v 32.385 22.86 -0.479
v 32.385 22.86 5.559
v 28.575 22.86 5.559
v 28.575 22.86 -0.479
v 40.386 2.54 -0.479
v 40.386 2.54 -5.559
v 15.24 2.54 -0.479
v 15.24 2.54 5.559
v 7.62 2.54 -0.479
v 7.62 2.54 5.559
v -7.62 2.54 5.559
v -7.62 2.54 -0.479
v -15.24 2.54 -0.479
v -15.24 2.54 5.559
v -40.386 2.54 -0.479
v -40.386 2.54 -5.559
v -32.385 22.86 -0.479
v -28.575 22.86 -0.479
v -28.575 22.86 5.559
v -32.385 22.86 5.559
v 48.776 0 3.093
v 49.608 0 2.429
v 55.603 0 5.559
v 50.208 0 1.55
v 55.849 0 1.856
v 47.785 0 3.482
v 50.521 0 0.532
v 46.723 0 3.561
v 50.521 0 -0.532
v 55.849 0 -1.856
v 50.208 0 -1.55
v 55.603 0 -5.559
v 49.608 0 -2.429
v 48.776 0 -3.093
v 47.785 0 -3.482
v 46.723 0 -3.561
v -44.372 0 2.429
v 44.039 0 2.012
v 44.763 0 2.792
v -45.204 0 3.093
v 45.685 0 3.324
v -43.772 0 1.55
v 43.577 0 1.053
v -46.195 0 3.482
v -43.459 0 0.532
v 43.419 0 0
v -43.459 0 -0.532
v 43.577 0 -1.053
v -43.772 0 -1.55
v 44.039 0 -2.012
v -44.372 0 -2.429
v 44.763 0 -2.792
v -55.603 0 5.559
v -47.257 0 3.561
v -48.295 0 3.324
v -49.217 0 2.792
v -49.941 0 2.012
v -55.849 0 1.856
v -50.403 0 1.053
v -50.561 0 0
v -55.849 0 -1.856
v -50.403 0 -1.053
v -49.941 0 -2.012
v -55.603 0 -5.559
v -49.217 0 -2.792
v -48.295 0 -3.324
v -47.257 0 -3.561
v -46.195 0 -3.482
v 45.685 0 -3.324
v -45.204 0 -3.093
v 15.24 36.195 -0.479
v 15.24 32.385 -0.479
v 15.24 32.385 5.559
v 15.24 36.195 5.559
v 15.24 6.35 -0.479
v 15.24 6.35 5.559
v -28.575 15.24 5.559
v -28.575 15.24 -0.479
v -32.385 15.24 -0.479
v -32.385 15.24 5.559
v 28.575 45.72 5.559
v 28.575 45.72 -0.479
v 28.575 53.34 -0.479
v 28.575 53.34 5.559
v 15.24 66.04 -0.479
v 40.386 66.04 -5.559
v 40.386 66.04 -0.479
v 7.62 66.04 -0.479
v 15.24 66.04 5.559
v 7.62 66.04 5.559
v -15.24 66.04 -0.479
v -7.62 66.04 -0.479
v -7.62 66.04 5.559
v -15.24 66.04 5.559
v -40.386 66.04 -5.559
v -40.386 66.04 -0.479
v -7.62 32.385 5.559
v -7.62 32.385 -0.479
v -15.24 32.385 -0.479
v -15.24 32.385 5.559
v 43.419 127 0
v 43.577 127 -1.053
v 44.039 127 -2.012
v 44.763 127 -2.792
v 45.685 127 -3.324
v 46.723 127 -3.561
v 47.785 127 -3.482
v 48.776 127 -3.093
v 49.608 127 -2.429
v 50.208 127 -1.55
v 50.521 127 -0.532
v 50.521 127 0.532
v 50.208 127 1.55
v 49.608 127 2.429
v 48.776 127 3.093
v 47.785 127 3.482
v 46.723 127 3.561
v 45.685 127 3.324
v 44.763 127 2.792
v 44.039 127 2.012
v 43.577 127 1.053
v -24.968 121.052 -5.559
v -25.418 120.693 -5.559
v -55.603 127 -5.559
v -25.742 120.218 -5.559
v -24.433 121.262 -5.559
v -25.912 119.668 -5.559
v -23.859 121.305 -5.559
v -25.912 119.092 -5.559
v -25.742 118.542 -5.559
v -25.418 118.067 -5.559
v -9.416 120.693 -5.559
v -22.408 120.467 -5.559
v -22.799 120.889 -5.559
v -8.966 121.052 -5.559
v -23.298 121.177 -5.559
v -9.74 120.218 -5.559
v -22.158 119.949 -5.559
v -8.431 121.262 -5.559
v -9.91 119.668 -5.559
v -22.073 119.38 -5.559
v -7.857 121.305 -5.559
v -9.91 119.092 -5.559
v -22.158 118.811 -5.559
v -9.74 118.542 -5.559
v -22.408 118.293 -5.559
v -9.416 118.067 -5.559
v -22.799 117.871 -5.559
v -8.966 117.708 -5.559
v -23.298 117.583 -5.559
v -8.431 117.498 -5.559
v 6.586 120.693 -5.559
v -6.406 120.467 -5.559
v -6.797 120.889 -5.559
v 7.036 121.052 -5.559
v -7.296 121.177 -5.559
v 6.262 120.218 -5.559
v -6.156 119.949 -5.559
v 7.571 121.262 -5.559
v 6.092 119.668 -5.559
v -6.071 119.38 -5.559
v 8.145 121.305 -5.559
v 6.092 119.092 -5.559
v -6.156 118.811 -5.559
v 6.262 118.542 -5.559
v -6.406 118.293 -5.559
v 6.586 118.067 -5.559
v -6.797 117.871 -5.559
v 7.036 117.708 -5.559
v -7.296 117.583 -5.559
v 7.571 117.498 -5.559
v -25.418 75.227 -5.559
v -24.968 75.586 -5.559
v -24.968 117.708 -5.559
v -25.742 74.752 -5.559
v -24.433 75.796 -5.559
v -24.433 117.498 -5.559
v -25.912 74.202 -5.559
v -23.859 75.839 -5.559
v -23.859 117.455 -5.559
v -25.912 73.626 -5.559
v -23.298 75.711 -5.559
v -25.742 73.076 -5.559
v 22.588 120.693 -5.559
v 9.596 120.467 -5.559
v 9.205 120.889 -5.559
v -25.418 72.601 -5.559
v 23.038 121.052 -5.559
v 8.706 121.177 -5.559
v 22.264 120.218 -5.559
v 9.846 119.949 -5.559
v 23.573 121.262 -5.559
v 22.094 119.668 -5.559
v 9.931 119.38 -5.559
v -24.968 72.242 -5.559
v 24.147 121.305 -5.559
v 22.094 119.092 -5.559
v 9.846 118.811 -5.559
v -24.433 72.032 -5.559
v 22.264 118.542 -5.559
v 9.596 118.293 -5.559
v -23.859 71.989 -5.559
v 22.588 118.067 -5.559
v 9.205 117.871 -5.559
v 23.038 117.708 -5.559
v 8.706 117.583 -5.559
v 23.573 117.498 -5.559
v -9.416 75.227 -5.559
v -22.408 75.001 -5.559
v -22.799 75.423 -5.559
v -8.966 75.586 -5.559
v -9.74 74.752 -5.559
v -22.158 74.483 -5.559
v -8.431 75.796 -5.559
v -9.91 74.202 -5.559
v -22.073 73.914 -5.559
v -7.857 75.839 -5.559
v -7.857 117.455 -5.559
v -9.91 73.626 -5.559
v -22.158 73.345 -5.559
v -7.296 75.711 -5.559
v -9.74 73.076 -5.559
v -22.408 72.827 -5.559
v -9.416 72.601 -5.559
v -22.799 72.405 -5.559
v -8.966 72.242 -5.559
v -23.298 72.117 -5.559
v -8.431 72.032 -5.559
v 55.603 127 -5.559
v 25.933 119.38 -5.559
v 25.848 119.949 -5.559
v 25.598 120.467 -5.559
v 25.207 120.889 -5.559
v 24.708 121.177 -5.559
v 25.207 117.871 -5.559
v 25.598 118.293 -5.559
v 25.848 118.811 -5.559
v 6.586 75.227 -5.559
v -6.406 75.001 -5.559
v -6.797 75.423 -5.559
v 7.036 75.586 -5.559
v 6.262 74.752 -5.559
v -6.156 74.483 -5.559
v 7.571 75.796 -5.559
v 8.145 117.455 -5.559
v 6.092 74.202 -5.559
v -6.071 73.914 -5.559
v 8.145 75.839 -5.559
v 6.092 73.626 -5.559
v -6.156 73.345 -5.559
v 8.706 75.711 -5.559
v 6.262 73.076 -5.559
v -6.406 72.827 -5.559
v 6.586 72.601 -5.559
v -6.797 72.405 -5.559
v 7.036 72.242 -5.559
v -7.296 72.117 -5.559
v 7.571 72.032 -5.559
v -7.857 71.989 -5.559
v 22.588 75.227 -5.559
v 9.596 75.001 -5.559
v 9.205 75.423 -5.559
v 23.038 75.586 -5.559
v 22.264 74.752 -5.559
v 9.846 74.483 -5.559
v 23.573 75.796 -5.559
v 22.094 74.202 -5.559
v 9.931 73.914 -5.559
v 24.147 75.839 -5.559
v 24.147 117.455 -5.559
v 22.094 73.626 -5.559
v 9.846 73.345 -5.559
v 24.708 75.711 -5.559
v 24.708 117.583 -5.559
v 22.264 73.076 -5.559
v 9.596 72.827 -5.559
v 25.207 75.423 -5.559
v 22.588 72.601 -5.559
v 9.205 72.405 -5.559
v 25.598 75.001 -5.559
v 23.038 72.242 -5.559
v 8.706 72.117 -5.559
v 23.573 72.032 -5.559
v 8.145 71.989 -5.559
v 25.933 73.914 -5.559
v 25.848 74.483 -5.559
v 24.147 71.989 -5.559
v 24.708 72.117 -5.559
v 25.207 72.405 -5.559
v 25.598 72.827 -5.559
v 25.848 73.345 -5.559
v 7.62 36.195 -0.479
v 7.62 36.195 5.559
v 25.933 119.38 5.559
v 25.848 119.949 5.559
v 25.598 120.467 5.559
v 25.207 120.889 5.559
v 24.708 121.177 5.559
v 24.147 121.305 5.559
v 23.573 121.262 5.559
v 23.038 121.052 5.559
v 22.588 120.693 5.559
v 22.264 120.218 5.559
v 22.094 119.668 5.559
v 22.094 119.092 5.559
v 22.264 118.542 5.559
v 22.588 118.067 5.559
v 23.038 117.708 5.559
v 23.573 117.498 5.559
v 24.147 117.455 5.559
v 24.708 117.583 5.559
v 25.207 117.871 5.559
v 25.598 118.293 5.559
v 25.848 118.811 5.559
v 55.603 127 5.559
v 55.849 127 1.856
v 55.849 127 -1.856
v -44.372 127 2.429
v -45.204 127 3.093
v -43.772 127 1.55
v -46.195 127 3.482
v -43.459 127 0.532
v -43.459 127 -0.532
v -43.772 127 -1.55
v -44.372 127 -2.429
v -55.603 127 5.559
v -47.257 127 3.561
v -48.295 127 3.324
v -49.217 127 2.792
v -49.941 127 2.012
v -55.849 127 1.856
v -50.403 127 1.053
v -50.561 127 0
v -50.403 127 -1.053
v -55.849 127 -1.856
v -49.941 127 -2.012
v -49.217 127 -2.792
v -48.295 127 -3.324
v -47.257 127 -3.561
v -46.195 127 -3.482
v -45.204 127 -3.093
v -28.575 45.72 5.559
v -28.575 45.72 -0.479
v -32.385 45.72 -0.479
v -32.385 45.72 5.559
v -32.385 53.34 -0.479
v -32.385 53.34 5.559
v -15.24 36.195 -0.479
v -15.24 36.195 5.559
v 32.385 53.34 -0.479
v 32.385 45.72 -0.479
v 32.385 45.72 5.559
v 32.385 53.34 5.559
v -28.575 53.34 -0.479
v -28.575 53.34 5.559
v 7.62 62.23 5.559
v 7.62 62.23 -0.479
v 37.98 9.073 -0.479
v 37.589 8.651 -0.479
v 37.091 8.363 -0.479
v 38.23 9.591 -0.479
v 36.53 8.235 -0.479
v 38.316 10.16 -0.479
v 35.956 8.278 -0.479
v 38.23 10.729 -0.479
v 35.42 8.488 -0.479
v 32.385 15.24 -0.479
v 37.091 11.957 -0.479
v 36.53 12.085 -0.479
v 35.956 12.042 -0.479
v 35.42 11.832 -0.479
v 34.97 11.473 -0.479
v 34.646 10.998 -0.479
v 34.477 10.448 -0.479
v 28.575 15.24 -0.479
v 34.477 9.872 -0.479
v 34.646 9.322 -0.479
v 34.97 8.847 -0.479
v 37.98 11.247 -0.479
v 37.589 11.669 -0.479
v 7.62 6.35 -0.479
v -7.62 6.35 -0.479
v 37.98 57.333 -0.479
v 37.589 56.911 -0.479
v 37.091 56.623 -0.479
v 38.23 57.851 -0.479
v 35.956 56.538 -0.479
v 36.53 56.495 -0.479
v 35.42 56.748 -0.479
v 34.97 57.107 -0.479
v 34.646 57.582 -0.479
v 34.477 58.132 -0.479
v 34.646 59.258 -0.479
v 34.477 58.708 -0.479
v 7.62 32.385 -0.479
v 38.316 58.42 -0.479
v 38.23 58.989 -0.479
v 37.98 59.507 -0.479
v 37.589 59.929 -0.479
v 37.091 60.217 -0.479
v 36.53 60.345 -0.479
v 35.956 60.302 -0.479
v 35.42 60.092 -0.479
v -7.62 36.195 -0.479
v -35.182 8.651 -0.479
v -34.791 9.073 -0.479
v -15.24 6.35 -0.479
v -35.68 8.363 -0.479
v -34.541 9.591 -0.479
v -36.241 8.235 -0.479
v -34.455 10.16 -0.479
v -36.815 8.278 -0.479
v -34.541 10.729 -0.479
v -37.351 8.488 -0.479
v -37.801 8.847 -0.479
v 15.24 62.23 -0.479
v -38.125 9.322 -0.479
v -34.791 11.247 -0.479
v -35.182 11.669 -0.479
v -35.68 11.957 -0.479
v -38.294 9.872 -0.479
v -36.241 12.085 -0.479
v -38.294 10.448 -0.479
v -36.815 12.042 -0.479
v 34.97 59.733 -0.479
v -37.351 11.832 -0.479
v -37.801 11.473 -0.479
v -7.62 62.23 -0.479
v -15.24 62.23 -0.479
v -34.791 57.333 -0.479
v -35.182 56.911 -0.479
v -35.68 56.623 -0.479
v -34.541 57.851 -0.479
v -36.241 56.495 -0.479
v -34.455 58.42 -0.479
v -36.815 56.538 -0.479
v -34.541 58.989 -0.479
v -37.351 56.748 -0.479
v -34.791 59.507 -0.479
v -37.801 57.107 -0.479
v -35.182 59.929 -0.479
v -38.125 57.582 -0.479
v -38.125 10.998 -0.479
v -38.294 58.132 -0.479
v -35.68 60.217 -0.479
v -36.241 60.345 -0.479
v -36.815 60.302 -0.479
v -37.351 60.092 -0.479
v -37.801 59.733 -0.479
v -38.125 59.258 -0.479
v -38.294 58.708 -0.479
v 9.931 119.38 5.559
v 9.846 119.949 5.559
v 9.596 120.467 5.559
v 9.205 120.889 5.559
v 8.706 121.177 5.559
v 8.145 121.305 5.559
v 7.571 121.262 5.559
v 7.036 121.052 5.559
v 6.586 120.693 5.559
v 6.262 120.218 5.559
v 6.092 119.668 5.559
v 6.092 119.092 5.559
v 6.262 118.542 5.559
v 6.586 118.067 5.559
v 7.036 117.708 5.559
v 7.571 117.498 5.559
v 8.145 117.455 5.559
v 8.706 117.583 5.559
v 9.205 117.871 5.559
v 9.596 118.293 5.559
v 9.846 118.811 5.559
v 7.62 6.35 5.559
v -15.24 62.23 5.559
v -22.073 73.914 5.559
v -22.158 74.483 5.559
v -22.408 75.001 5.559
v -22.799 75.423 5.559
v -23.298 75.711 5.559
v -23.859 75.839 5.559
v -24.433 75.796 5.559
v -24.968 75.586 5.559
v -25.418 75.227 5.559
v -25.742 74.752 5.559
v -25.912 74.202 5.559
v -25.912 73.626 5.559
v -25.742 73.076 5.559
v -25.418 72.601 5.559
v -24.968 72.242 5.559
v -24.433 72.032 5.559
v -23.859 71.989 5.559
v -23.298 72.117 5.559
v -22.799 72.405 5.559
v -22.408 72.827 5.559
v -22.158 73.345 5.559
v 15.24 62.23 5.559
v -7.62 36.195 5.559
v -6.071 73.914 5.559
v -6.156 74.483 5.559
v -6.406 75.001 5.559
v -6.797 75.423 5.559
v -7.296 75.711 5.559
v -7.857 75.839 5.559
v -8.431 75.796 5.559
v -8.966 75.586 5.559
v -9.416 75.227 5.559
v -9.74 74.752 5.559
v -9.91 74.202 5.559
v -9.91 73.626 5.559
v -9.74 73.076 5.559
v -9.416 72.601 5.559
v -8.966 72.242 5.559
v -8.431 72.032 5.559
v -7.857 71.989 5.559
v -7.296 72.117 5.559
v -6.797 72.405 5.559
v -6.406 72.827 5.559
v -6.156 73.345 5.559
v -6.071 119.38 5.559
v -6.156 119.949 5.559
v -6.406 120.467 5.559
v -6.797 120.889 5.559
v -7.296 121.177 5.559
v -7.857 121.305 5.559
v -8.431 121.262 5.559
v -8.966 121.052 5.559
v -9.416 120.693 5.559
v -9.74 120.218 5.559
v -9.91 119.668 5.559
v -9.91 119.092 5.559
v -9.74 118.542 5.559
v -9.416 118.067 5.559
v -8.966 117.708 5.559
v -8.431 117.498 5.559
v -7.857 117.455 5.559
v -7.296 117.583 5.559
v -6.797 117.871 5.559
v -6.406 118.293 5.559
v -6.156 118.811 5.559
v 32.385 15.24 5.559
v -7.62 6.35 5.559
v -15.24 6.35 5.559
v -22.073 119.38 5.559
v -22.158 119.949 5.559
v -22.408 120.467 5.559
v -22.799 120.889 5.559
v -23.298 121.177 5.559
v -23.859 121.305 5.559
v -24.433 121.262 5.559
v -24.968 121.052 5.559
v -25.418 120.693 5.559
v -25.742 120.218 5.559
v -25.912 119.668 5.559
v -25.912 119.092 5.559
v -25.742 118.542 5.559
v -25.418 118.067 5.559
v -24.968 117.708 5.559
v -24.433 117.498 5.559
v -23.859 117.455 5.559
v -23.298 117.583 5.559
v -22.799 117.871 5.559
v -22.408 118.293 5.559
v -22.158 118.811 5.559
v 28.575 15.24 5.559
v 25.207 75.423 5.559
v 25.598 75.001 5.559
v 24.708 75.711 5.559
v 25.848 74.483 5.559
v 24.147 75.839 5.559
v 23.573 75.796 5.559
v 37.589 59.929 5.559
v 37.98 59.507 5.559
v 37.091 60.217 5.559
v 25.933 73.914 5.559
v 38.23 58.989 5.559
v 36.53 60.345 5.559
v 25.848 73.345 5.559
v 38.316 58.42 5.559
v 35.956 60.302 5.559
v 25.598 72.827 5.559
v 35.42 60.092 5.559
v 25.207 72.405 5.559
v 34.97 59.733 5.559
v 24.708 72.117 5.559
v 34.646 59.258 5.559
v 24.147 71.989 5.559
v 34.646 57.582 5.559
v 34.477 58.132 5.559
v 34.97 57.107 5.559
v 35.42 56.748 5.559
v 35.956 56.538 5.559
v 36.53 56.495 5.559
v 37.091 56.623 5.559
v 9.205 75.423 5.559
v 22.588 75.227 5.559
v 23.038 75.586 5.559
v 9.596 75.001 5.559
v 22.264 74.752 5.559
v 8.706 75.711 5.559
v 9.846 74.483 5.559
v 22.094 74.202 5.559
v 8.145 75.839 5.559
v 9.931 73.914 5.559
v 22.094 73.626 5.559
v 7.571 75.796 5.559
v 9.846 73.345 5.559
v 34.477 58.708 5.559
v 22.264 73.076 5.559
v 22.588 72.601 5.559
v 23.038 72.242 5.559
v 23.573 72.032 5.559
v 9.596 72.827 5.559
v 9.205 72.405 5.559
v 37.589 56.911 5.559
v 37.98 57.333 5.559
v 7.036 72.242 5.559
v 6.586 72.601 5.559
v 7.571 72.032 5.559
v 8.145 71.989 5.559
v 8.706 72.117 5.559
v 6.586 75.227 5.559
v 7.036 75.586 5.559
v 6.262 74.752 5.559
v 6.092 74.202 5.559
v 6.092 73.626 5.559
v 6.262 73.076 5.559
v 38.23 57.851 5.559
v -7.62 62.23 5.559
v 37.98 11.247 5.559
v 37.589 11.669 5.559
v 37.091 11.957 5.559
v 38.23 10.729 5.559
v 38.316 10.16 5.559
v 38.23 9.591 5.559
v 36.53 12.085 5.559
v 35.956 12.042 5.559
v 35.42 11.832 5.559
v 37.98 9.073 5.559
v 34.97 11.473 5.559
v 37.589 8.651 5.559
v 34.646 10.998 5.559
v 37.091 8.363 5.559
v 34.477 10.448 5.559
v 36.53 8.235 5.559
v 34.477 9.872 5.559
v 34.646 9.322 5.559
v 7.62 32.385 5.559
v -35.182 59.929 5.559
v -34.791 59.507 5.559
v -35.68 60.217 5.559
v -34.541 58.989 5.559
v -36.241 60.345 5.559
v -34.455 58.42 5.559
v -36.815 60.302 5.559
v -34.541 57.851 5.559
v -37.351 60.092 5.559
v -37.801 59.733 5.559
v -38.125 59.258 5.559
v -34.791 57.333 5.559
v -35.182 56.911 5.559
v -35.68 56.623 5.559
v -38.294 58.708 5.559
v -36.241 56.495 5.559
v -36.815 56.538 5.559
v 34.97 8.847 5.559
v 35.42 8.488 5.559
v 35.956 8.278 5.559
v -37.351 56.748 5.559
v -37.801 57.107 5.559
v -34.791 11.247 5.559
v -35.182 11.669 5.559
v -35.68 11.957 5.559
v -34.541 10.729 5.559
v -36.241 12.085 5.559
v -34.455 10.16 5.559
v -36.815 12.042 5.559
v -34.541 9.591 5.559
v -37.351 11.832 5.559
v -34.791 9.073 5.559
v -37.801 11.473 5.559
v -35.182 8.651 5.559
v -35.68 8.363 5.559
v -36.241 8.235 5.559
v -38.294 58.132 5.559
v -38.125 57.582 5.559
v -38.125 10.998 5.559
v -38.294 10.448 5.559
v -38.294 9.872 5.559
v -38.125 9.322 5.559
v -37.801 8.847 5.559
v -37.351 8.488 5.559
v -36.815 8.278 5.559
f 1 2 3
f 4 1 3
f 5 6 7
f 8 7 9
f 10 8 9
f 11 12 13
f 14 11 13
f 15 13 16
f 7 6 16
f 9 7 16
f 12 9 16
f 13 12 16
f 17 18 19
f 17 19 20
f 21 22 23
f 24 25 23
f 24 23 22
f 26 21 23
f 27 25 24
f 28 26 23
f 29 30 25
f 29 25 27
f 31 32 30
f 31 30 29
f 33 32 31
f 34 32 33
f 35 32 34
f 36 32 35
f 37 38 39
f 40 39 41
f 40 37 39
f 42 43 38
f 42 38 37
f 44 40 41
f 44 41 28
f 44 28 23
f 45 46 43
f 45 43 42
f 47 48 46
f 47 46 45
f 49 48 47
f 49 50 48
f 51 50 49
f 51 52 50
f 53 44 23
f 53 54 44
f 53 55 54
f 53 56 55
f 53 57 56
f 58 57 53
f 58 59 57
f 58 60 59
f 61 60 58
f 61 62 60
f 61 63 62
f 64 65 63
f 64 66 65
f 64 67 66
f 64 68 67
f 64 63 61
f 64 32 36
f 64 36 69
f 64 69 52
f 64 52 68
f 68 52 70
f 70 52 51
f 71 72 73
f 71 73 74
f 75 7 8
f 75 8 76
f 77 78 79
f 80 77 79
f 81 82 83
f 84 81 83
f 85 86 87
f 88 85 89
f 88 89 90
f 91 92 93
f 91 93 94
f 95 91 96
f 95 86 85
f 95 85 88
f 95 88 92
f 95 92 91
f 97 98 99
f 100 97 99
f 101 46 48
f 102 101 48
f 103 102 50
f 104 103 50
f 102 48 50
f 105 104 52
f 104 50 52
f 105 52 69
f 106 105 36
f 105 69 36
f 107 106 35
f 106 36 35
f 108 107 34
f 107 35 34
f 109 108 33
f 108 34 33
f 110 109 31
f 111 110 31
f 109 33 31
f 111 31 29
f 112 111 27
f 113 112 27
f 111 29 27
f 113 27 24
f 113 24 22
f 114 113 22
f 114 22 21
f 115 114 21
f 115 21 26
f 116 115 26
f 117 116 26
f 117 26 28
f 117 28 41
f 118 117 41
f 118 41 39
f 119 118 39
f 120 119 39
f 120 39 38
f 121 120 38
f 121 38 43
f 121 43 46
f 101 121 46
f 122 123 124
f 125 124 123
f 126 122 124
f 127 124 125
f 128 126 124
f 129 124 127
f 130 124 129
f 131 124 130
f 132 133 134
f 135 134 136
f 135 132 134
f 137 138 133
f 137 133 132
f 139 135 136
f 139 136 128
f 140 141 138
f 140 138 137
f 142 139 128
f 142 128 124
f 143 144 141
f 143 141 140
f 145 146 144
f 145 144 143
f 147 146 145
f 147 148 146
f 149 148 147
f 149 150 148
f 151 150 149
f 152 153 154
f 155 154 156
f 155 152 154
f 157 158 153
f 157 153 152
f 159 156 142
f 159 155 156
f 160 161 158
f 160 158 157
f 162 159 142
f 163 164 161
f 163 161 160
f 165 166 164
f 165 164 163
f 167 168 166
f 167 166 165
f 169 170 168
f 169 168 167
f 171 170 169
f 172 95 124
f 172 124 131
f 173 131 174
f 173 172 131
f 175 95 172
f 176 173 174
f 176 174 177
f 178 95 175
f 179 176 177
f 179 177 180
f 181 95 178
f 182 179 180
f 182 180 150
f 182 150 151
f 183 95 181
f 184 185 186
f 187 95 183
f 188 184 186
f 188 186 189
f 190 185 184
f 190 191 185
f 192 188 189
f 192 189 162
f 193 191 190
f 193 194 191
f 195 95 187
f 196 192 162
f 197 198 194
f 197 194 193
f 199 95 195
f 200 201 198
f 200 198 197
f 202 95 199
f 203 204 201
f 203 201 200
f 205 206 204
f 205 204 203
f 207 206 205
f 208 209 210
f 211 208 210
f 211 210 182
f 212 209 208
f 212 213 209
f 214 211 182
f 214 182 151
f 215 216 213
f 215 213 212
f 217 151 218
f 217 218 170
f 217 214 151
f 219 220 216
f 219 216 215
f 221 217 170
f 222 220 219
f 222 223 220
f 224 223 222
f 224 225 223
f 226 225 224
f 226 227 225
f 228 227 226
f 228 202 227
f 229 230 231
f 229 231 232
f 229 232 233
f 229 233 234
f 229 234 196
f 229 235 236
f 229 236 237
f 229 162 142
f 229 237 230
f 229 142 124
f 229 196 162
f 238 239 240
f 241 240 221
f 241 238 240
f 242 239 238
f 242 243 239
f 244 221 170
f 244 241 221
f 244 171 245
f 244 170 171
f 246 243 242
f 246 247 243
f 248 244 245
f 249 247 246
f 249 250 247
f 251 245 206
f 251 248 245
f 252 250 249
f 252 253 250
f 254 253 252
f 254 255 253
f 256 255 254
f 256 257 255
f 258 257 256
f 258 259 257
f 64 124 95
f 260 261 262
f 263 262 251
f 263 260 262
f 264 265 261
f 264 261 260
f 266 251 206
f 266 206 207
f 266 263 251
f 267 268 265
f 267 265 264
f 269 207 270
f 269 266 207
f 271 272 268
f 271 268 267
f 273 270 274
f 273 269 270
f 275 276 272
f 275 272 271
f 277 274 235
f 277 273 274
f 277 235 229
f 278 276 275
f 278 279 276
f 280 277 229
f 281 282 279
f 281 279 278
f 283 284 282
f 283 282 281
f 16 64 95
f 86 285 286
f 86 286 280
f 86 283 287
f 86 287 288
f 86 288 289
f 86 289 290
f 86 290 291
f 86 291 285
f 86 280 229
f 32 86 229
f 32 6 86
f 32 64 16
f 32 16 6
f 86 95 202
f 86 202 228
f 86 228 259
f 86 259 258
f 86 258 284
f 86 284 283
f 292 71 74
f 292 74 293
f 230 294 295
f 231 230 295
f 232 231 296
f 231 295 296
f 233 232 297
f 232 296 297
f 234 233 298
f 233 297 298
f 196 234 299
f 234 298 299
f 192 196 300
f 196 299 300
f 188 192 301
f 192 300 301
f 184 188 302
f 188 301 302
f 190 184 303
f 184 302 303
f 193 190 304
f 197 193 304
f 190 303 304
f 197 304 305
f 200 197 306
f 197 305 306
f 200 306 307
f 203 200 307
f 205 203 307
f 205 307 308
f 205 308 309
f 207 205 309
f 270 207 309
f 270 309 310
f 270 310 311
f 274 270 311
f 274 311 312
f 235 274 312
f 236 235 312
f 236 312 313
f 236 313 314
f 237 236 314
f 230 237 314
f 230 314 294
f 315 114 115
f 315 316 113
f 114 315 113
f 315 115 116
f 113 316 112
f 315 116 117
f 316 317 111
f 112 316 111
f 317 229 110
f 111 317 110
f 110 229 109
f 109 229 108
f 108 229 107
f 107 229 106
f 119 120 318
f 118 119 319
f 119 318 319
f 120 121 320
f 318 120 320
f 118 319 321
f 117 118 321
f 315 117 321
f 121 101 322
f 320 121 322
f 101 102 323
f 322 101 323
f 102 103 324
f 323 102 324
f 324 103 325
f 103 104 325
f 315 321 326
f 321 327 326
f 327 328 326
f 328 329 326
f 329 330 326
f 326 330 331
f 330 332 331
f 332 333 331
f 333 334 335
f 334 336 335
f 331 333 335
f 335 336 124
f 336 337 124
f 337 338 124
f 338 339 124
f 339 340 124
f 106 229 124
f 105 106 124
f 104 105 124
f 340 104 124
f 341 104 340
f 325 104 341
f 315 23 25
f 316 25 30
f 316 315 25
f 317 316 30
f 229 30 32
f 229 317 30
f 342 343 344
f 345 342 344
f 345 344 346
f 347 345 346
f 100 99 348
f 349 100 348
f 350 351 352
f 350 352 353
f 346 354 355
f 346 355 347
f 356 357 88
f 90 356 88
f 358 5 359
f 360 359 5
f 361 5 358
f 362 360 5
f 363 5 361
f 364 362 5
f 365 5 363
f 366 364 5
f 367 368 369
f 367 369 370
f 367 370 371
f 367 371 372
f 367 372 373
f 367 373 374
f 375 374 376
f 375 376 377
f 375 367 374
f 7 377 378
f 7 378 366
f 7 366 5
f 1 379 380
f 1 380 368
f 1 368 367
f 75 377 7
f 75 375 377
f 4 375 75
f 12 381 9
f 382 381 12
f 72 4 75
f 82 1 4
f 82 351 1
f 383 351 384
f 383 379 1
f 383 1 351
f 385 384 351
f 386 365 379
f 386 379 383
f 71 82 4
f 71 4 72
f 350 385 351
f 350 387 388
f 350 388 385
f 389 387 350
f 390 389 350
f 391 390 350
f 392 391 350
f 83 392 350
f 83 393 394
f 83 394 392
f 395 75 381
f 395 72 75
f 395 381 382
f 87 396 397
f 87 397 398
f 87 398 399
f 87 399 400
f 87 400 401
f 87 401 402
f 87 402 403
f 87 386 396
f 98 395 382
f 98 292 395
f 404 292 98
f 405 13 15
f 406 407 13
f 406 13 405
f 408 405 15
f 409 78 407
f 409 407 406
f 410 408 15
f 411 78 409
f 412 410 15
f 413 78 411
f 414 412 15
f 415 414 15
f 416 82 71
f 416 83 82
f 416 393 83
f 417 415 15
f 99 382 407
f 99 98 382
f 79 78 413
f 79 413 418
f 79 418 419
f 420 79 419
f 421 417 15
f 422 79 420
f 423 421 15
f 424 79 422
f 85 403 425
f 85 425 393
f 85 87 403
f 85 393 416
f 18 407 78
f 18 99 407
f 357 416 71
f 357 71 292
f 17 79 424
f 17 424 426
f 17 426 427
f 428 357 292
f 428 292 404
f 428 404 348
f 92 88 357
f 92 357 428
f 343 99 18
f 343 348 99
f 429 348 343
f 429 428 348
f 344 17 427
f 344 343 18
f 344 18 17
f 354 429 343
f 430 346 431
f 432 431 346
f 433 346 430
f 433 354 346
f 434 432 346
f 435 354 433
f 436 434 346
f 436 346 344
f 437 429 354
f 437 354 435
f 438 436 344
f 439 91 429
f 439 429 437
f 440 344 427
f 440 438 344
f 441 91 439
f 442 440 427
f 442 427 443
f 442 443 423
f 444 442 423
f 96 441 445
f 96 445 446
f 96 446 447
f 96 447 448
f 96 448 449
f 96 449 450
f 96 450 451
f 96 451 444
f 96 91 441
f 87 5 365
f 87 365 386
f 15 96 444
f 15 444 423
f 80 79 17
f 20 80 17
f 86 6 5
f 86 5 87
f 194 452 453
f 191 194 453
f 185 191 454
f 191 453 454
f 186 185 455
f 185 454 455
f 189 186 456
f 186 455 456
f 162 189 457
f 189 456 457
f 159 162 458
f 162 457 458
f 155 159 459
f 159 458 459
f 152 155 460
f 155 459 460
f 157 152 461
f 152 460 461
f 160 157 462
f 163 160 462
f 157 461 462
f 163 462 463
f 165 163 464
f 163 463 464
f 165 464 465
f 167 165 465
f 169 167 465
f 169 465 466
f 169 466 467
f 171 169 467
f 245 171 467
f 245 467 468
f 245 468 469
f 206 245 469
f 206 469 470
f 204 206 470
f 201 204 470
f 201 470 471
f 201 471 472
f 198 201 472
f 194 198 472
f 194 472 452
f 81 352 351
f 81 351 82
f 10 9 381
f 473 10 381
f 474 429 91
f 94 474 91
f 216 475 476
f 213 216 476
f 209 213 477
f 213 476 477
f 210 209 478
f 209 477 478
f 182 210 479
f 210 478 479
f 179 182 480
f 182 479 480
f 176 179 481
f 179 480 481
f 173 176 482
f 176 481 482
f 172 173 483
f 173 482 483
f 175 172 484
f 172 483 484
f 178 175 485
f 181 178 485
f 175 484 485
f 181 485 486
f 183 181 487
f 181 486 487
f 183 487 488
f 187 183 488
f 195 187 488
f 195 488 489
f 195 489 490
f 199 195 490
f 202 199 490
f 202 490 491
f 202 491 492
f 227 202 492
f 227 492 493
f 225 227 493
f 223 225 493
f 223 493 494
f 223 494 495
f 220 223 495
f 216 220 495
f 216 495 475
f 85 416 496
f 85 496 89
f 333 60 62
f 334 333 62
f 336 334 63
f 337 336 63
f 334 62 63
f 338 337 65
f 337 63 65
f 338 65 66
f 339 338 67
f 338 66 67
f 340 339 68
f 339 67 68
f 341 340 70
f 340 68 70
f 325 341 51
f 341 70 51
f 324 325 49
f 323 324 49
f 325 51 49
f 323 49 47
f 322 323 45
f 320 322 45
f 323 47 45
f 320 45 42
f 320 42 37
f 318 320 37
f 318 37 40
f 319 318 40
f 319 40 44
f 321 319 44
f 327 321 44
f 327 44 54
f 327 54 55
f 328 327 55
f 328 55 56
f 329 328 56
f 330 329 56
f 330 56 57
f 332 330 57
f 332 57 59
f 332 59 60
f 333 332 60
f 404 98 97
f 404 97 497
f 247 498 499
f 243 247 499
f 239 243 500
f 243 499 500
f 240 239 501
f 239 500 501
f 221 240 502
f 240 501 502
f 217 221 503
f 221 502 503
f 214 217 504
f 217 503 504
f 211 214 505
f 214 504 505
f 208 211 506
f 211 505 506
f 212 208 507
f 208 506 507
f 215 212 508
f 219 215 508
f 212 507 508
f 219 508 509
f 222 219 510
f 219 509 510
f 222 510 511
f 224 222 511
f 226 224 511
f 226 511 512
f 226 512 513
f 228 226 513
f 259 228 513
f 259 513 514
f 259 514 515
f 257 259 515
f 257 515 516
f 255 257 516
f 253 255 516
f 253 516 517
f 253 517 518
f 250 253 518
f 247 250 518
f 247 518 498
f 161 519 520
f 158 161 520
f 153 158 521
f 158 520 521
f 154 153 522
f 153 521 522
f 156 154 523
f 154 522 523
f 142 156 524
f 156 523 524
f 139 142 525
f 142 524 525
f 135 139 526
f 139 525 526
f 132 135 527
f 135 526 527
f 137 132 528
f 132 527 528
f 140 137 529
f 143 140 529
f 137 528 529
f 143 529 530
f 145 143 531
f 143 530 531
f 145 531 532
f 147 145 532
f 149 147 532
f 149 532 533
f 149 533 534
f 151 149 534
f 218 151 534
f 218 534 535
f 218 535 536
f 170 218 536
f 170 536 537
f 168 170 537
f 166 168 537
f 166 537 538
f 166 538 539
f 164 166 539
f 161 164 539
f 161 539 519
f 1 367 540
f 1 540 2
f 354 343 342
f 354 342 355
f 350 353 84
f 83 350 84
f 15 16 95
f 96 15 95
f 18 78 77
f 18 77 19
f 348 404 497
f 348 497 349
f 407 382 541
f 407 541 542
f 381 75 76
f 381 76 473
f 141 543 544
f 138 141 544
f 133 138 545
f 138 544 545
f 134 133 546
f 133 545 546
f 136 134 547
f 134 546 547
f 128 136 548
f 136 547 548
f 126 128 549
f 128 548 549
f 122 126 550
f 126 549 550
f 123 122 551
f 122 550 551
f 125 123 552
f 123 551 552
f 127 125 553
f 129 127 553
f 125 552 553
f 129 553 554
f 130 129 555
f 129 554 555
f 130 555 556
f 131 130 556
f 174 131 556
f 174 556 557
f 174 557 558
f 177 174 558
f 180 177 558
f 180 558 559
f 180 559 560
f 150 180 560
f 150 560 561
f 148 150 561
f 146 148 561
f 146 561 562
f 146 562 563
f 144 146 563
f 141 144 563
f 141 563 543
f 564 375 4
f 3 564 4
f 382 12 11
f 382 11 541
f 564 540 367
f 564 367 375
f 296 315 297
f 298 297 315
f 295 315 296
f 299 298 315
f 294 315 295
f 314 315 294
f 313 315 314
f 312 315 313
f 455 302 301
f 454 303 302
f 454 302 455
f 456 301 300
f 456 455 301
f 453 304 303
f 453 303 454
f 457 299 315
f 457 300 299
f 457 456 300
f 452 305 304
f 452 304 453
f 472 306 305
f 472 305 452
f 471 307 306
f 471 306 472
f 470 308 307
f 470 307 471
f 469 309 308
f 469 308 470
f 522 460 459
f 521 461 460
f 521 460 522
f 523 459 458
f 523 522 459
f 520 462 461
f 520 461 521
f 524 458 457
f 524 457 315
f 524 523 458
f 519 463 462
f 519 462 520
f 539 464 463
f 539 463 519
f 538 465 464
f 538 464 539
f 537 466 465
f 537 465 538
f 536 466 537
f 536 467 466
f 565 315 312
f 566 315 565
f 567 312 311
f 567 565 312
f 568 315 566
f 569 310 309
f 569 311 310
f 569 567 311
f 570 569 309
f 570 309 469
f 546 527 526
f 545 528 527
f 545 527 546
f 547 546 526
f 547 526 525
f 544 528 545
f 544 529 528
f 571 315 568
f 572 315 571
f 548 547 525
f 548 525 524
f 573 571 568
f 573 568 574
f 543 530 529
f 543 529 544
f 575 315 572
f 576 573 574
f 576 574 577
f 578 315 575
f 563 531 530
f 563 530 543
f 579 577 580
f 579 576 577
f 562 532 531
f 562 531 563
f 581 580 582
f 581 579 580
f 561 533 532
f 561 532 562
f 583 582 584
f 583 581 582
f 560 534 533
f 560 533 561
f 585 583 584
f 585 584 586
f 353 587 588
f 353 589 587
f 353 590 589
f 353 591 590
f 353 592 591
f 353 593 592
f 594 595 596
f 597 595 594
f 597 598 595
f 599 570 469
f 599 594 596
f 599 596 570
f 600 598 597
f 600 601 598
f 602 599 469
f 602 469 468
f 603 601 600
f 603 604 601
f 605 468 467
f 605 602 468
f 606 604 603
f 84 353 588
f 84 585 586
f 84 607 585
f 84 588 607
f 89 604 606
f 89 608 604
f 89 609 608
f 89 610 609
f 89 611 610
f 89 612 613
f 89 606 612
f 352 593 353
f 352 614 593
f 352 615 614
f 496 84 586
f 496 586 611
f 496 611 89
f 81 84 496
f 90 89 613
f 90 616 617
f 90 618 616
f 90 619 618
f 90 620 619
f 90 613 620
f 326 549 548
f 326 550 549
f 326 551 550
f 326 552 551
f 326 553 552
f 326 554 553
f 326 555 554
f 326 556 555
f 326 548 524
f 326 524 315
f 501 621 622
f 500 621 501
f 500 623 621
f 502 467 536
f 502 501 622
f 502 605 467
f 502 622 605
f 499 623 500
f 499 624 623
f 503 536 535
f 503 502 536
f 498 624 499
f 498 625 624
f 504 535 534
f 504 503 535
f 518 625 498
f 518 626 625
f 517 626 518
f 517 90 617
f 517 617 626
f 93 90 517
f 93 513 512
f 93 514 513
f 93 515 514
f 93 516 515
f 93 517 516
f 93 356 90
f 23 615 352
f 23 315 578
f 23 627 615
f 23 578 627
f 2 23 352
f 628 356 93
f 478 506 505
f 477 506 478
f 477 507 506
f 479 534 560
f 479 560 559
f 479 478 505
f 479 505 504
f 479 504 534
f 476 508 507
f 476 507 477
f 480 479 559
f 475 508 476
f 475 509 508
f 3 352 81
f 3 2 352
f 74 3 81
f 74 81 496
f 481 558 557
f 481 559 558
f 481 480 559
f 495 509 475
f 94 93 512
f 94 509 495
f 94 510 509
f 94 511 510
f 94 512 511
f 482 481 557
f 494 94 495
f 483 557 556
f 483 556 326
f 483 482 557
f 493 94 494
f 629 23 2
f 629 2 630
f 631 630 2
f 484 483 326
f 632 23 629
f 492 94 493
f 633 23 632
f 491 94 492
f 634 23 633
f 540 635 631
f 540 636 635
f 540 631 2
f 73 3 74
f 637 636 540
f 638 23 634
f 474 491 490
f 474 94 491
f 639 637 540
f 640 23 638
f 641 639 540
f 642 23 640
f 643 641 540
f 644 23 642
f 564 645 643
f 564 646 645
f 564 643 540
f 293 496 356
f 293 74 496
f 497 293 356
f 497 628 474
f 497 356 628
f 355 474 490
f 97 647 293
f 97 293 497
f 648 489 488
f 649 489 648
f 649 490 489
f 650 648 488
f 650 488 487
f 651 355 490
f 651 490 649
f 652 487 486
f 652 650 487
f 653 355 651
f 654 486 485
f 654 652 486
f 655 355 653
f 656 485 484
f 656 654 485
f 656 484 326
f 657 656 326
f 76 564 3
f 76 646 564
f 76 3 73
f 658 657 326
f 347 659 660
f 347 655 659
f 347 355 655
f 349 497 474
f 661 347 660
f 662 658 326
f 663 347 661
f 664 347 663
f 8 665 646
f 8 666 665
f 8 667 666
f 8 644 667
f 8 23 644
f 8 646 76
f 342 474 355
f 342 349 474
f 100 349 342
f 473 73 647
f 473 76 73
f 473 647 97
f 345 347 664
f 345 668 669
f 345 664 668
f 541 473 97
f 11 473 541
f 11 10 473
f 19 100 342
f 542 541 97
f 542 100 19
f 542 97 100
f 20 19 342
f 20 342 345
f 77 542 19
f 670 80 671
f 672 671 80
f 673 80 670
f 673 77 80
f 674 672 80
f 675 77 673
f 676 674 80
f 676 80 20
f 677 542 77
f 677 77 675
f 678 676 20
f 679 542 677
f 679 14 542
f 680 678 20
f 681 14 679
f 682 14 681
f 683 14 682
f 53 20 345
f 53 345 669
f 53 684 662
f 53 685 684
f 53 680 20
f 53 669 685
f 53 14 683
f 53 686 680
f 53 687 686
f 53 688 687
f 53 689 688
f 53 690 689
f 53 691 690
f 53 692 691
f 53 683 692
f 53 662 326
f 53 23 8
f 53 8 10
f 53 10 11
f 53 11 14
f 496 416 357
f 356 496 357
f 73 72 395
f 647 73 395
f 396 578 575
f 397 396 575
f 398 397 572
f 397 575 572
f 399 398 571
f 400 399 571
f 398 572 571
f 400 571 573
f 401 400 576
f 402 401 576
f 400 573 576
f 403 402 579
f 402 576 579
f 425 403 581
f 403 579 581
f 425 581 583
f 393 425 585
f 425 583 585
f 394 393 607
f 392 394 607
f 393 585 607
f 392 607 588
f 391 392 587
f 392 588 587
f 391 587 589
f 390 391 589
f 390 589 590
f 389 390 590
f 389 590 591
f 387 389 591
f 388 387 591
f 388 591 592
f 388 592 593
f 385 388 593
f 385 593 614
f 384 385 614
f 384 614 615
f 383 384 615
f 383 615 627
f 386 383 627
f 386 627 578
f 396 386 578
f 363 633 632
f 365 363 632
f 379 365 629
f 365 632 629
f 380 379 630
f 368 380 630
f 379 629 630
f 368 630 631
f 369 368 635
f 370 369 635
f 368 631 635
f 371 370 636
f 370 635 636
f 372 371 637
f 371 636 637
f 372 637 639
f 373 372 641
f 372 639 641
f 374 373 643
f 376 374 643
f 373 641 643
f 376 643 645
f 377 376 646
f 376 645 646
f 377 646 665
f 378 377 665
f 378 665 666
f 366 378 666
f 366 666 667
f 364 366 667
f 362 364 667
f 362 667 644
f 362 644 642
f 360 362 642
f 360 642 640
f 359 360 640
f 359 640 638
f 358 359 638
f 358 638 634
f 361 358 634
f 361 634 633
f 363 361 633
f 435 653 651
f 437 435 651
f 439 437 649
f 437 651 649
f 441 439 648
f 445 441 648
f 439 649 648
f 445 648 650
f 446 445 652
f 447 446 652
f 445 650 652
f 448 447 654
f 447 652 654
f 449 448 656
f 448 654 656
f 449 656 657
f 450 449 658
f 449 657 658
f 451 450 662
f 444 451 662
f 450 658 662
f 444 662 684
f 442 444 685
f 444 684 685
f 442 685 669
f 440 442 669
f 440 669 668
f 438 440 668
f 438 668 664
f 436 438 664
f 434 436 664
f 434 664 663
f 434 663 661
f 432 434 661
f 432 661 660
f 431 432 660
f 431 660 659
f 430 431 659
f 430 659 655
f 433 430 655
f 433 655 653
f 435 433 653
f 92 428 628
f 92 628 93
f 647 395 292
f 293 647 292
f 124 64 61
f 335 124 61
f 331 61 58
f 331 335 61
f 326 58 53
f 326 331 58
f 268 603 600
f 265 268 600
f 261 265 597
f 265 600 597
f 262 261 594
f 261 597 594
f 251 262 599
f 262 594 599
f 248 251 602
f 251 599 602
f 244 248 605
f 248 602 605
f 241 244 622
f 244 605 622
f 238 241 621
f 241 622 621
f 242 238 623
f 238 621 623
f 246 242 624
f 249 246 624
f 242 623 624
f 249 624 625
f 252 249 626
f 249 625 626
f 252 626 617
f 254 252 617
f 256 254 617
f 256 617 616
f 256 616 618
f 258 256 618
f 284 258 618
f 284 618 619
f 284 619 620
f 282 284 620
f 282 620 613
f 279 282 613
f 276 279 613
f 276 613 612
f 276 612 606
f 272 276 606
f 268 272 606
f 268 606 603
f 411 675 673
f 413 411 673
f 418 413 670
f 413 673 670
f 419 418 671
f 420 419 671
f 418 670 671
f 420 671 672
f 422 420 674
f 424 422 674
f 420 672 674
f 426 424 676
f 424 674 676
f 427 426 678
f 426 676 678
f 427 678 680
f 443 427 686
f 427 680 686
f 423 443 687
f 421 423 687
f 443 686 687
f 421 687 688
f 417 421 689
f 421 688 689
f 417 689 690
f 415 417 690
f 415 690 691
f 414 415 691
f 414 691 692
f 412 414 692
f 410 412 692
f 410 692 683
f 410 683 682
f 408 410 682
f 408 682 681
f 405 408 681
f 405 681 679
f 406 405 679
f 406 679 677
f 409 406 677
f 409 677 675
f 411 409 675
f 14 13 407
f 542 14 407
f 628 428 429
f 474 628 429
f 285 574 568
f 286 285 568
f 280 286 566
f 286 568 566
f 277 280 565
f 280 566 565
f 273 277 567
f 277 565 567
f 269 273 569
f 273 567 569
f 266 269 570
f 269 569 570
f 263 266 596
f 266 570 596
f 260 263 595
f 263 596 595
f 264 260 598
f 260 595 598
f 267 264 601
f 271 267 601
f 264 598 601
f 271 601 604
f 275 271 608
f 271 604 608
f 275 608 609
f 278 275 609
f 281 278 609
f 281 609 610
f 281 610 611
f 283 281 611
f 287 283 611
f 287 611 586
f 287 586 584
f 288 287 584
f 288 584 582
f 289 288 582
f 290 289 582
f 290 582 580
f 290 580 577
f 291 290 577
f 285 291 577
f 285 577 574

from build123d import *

# Parameters (mm, degrees)
BOSS_EXTRUDE1_DEPTH     = 127
F_1_4_CLEARANCE_HOLE1_D = 7.14248
F_8_CLEARANCE_HOLE1_D   = 3.8608
SKETCH19_W              = 7.62
SKETCH19_H              = 3.81
SKETCH19_W_2            = 3.81
SKETCH19_H_2            = 7.62
CUT_EXTRUDE3_DEPTH      = 12.118122863
F_8_CLEARANCE_HOLE2_D   = 3.8608
F_8_CLEARANCE_HOLE3_D   = 3.8608
SKETCH10_W              = 64.77
SKETCH10_H              = 63.5
CUT_EXTRUDE4_DEPTH      = 5.08
SKETCH36_R              = 76.2
SKETCH36_R_2            = 55.88
CUT_EXTRUDE5_DEPTH      = 128
SKETCH37_W              = 80.772
SKETCH37_H              = 63.5
CUT_EXTRUDE6_DEPTH      = 5.08


with BuildPart() as part:
    # Sketch1 → Boss-Extrude1 (new body)
    with BuildSketch(Plane(origin=(0, 0, 0), x_dir=(1, 0, 0), z_dir=(0, 1, 0))):
        with BuildLine():
            Line((-60.706, 5.559061432), (60.706, 5.559061432))
            ThreePointArc((60.706, 5.559061432), (60.96, 0), (60.706, -5.559061432))
            Line((60.706, -5.559061432), (-60.706, -5.559061432))
            ThreePointArc((-60.706, -5.559061432), (-60.96, 0), (-60.706, 5.559061432))
        make_face()
    extrude(amount=BOSS_EXTRUDE1_DEPTH)

    # 1/4 Clearance Hole1 (through all)
    with Locations(Plane(origin=(0, 127, 0), x_dir=(1, 0, 0), z_dir=(0, 1, 0))):
        with Locations((-46.99, 0), (46.99, 0)):
            Hole(F_1_4_CLEARANCE_HOLE1_D / 2)

    # #8 Clearance Hole1 (through all)
    with Locations(Plane(origin=(0, 0, -5.559061432), x_dir=(-1, 0, 0), z_dir=(0, 0, -1))):
        with Locations((-8.001, 119.38), (-8.001, 73.914), (8.001, 73.914), (8.001, 119.38)):
            Hole(F_8_CLEARANCE_HOLE1_D / 2)

    # Sketch19 → Cut-Extrude3 (cut, through all)
    with BuildSketch(Plane(origin=(0, 0, -5.559061432), x_dir=(-1, 0, 0), z_dir=(0, 0, -1))):
        with Locations((-11.43, 34.29)):
            Rectangle(SKETCH19_W, SKETCH19_H)
        with Locations((30.48, 49.53)):
            Rectangle(SKETCH19_W_2, SKETCH19_H_2)
        with Locations((-11.43, 64.135)):
            Rectangle(SKETCH19_W, SKETCH19_H)
        with Locations((11.43, 64.135)):
            Rectangle(SKETCH19_W, SKETCH19_H)
        with Locations((-11.43, 4.445)):
            Rectangle(SKETCH19_W, SKETCH19_H)
        with Locations((11.43, 4.445)):
            Rectangle(SKETCH19_W, SKETCH19_H)
        with Locations((-30.48, 49.53)):
            Rectangle(SKETCH19_W_2, SKETCH19_H_2)
        with Locations((30.48, 19.05)):
            Rectangle(SKETCH19_W_2, SKETCH19_H_2)
        with Locations((-30.48, 19.05)):
            Rectangle(SKETCH19_W_2, SKETCH19_H_2)
        with Locations((11.43, 34.29)):
            Rectangle(SKETCH19_W, SKETCH19_H)
    extrude(amount=-CUT_EXTRUDE3_DEPTH, mode=Mode.SUBTRACT)

    # #8 Clearance Hole2 (through all)
    with Locations(Plane(origin=(0, 0, -5.559061432), x_dir=(-1, 0, 0), z_dir=(0, 0, -1))):
        with Locations((-24.003, 119.38), (-24.003, 73.914), (24.003, 73.914), (24.003, 119.38)):
            Hole(F_8_CLEARANCE_HOLE2_D / 2)

    # #8 Clearance Hole3 (through all)
    with Locations(Plane(origin=(0, 0, -5.559061432), x_dir=(-1, 0, 0), z_dir=(0, 0, -1))):
        with Locations((-36.3855, 58.42), (-36.3855, 10.16), (36.3855, 10.16), (36.3855, 58.42)):
            Hole(F_8_CLEARANCE_HOLE3_D / 2)

    # Sketch10 → Cut-Extrude4 (cut)
    with BuildSketch(Plane(origin=(0, 0, -5.559061432), x_dir=(-1, 0, 0), z_dir=(0, 0, -1))):
        with Locations((0, 34.29)):
            Rectangle(SKETCH10_W, SKETCH10_H)
    extrude(amount=-CUT_EXTRUDE4_DEPTH, mode=Mode.SUBTRACT)

    # Sketch36 → Cut-Extrude5 (cut, through all)
    with BuildSketch(Plane(origin=(0, 127, 0), x_dir=(1, 0, 0), z_dir=(0, 1, 0))):
        Circle(SKETCH36_R)
        Circle(SKETCH36_R_2, mode=Mode.SUBTRACT)
    extrude(amount=-CUT_EXTRUDE5_DEPTH, mode=Mode.SUBTRACT)

    # Sketch37 → Cut-Extrude6 (cut)
    with BuildSketch(Plane(origin=(0, 0, -5.559061432), x_dir=(-1, 0, 0), z_dir=(0, 0, -1))):
        with Locations((0, 34.29)):
            Rectangle(SKETCH37_W, SKETCH37_H)
    extrude(amount=-CUT_EXTRUDE6_DEPTH, mode=Mode.SUBTRACT)


solid = part.part
